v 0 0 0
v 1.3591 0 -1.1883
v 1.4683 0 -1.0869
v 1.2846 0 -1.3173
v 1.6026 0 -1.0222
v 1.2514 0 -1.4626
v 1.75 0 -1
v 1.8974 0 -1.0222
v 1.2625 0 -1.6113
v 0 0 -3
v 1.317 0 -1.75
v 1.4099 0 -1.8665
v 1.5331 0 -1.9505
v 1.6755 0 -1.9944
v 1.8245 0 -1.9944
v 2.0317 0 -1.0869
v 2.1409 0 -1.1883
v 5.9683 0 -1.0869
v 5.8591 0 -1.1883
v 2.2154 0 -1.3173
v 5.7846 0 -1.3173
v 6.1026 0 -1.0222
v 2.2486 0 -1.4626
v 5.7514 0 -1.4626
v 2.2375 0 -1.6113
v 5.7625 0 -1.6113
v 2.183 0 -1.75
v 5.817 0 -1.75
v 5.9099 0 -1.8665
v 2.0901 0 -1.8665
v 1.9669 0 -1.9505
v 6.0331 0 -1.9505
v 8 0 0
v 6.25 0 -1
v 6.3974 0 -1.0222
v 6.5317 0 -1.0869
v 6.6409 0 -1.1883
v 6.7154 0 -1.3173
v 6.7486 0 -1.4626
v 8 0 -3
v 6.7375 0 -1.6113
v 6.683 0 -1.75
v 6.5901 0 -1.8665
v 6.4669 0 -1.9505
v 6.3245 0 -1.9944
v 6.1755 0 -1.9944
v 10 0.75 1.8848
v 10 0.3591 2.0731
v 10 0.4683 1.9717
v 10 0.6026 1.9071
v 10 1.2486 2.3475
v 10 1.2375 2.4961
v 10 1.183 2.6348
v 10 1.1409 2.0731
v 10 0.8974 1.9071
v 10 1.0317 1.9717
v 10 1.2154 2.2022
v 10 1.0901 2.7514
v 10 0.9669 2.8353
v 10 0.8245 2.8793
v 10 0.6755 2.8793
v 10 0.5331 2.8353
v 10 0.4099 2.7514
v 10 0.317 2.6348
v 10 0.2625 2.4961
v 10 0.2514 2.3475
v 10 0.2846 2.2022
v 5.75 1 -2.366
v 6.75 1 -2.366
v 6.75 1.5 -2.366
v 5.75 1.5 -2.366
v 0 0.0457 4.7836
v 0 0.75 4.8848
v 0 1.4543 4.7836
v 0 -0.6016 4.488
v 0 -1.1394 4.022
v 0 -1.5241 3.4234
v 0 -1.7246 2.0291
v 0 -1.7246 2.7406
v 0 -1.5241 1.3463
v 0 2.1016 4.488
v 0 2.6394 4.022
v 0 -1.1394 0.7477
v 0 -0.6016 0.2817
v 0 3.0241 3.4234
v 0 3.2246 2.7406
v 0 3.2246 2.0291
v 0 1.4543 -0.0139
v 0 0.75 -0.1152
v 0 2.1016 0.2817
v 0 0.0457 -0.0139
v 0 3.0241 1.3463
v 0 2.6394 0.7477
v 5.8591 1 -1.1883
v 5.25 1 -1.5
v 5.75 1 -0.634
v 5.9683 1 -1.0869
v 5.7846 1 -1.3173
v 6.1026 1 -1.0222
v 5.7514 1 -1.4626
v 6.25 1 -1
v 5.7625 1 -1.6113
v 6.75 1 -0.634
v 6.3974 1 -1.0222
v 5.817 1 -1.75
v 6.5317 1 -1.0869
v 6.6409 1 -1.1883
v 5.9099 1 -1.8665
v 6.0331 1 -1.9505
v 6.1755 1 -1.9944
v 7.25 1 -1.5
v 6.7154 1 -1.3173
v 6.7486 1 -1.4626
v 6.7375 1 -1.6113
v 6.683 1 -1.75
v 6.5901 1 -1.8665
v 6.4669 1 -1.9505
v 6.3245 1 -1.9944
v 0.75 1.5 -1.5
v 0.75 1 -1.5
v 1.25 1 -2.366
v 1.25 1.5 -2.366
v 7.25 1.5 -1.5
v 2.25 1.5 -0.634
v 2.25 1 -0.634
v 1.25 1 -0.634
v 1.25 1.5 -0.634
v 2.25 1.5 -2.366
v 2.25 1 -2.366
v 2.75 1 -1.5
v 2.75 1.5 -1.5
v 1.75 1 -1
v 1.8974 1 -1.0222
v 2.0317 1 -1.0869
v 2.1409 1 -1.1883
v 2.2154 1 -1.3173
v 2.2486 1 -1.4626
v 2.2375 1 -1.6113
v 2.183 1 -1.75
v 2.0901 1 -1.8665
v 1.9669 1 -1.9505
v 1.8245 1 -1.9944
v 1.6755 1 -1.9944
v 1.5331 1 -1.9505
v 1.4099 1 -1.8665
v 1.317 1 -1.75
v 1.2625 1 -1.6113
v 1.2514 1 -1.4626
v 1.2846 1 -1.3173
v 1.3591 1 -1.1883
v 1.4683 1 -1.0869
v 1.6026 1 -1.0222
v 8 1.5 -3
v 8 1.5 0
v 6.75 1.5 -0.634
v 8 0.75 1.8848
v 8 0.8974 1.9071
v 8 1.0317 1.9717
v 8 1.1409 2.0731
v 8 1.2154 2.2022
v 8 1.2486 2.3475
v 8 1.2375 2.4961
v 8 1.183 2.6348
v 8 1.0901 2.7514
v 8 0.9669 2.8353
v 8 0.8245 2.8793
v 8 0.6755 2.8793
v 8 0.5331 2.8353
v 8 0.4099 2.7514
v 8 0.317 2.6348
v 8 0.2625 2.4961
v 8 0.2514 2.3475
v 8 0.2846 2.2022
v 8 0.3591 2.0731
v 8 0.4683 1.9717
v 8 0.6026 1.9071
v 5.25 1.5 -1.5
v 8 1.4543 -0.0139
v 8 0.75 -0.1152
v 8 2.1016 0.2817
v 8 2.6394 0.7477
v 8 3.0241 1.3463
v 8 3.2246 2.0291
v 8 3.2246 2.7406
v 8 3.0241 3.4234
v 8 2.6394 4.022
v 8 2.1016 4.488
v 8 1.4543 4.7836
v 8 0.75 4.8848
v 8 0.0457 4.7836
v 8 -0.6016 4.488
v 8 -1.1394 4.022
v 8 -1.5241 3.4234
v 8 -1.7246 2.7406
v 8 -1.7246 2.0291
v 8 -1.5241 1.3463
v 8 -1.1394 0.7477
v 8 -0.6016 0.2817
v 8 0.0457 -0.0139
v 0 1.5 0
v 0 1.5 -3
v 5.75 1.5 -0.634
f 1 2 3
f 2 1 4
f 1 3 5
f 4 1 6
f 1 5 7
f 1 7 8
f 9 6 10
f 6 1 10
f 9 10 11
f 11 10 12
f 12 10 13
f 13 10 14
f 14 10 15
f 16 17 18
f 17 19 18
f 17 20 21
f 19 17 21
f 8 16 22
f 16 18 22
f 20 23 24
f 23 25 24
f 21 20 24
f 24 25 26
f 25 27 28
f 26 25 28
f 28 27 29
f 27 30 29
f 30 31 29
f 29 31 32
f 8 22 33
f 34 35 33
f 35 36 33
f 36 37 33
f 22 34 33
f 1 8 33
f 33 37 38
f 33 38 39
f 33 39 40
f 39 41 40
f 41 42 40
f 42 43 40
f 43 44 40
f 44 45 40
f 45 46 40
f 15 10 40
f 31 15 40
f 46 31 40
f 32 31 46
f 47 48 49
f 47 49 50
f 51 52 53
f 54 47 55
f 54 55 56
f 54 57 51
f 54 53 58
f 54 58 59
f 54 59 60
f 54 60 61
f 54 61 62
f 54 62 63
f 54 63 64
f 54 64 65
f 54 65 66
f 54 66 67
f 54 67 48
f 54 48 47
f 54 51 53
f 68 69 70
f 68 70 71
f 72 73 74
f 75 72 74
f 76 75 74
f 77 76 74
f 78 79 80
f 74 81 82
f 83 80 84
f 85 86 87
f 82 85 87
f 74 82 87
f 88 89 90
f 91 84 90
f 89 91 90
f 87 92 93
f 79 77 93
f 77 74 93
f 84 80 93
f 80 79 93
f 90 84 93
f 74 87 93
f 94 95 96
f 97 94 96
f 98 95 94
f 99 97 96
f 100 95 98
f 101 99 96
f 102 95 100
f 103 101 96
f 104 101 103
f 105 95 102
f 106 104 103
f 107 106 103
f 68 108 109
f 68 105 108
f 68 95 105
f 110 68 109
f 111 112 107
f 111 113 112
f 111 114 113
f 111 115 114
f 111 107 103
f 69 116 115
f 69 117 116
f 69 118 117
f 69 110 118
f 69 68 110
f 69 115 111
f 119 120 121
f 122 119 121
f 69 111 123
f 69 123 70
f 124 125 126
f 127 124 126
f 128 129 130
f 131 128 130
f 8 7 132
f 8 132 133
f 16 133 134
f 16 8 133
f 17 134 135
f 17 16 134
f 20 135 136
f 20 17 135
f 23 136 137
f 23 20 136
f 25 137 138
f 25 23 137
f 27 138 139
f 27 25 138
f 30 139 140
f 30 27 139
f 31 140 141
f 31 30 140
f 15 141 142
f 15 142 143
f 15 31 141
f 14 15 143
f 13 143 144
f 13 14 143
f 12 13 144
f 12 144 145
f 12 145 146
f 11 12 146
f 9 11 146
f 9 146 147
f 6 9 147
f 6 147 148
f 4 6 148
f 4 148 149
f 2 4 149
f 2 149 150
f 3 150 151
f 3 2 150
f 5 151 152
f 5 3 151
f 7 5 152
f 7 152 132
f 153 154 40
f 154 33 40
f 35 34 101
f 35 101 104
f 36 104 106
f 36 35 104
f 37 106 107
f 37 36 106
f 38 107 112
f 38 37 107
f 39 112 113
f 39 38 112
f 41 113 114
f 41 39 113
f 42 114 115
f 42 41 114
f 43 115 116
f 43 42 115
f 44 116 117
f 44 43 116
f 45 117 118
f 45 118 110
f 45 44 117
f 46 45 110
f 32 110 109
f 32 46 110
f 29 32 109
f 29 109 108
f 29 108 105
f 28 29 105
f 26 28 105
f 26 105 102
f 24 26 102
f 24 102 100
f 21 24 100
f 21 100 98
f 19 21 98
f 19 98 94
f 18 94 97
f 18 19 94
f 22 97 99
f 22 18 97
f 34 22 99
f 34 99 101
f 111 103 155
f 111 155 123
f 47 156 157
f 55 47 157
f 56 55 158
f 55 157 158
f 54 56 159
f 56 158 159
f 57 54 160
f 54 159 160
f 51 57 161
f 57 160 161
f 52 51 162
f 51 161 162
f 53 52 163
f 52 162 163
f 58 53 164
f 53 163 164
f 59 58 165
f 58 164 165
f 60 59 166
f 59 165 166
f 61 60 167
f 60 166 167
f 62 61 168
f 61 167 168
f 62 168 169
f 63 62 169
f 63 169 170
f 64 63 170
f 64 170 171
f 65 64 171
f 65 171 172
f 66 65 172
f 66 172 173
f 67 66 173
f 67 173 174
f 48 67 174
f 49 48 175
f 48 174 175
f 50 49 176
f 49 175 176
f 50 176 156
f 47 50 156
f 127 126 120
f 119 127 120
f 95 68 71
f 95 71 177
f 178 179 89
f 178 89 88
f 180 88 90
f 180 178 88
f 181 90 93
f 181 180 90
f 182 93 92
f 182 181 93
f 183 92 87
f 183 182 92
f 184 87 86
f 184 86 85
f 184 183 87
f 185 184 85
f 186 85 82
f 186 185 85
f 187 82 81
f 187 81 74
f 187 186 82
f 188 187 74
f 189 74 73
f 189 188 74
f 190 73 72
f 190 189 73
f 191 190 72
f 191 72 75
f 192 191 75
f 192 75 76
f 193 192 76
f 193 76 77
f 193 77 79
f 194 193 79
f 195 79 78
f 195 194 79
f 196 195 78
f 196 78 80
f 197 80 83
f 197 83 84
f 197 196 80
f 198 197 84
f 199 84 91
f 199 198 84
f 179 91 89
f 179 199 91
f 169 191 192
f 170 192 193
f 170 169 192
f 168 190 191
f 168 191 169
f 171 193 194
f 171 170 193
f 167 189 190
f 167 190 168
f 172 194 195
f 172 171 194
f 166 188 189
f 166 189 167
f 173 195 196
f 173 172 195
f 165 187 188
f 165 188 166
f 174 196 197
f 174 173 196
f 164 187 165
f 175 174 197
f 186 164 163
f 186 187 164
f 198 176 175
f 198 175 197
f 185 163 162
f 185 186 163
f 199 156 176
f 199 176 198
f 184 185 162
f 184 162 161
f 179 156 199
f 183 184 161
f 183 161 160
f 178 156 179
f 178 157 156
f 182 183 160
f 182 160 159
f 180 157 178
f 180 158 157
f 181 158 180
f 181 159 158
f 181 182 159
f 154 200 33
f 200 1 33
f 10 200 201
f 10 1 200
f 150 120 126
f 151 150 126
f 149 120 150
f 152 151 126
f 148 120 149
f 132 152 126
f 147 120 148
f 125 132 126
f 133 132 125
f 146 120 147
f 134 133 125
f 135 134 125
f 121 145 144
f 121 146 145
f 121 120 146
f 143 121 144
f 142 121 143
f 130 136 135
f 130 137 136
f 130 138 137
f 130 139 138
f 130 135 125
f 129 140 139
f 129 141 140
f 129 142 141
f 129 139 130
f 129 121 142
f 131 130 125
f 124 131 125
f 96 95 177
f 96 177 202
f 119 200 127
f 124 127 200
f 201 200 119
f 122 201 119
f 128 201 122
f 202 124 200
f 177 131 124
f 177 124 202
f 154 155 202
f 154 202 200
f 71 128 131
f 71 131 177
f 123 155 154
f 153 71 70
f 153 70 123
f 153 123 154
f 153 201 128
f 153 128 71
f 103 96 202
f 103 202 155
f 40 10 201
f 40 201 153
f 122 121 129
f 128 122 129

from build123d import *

# Parameters (mm, degrees)
SKETCH_1_W      = 8
SKETCH_1_H      = 3
SKETCH_1_R      = 0.5
EXTRUDE_1_DEPTH = 1
SKETCH_2_W      = 8
SKETCH_2_H      = 3
EXTRUDE_2_DEPTH = 0.5
SKETCH_3_R      = 2.5
EXTRUDE_3_DEPTH = 8
SKETCH_6_R      = 0.5
EXTRUDE_4_DEPTH = 2


with BuildPart() as part:
    # 草图1 → 凸台-拉伸1 (new body)
    with BuildSketch(Plane(origin=(0, 0, 0), x_dir=(1, 0, 0), z_dir=(0, 1, 0))):
        with Locations((4, 1.5)):
            Rectangle(SKETCH_1_W, SKETCH_1_H)
        with Locations(Location((1.75, 1.5, 0), (0, 0, 270))):
            Circle(SKETCH_1_R, mode=Mode.SUBTRACT)
        with Locations(Location((6.25, 1.5, 0), (0, 0, 270))):
            Circle(SKETCH_1_R, mode=Mode.SUBTRACT)
    extrude(amount=EXTRUDE_1_DEPTH)

    # 草图2 → 凸台-拉伸2 (add)
    with BuildSketch(Plane(origin=(0, 1, 0), x_dir=(1, 0, 0), z_dir=(0, 1, 0))):
        with Locations((4, 1.5)):
            Rectangle(SKETCH_2_W, SKETCH_2_H)
        Polygon((2.25, 0.633974596), (1.25, 0.633974596), (0.75, 1.5), (1.25, 2.366025404), (2.25, 2.366025404), (2.75, 1.5), align=None, mode=Mode.SUBTRACT)
        Polygon((5.75, 2.366025404), (5.25, 1.5), (5.75, 0.633974596), (6.75, 0.633974596), (7.25, 1.5), (6.75, 2.366025404), align=None, mode=Mode.SUBTRACT)
    extrude(amount=EXTRUDE_2_DEPTH)


with BuildPart() as body_2:
    # 草图3 → 凸台-拉伸3 (new body)
    with BuildSketch(Plane(origin=(8, 0, 0), x_dir=(0, 0, -1), z_dir=(1, 0, 0))):
        with Locations((-2.384848004, 0.75)):
            Circle(SKETCH_3_R)
    extrude(amount=-EXTRUDE_3_DEPTH)

    # 草图6 → 凸台-拉伸4 (add)
    with BuildSketch(Plane(origin=(8, 0, 0), x_dir=(0, 0, -1), z_dir=(1, 0, 0))):
        with Locations((-2.384848004, 0.75)):
            Circle(SKETCH_6_R)
    extrude(amount=EXTRUDE_4_DEPTH)


solid = Compound([part.part, body_2.part])
